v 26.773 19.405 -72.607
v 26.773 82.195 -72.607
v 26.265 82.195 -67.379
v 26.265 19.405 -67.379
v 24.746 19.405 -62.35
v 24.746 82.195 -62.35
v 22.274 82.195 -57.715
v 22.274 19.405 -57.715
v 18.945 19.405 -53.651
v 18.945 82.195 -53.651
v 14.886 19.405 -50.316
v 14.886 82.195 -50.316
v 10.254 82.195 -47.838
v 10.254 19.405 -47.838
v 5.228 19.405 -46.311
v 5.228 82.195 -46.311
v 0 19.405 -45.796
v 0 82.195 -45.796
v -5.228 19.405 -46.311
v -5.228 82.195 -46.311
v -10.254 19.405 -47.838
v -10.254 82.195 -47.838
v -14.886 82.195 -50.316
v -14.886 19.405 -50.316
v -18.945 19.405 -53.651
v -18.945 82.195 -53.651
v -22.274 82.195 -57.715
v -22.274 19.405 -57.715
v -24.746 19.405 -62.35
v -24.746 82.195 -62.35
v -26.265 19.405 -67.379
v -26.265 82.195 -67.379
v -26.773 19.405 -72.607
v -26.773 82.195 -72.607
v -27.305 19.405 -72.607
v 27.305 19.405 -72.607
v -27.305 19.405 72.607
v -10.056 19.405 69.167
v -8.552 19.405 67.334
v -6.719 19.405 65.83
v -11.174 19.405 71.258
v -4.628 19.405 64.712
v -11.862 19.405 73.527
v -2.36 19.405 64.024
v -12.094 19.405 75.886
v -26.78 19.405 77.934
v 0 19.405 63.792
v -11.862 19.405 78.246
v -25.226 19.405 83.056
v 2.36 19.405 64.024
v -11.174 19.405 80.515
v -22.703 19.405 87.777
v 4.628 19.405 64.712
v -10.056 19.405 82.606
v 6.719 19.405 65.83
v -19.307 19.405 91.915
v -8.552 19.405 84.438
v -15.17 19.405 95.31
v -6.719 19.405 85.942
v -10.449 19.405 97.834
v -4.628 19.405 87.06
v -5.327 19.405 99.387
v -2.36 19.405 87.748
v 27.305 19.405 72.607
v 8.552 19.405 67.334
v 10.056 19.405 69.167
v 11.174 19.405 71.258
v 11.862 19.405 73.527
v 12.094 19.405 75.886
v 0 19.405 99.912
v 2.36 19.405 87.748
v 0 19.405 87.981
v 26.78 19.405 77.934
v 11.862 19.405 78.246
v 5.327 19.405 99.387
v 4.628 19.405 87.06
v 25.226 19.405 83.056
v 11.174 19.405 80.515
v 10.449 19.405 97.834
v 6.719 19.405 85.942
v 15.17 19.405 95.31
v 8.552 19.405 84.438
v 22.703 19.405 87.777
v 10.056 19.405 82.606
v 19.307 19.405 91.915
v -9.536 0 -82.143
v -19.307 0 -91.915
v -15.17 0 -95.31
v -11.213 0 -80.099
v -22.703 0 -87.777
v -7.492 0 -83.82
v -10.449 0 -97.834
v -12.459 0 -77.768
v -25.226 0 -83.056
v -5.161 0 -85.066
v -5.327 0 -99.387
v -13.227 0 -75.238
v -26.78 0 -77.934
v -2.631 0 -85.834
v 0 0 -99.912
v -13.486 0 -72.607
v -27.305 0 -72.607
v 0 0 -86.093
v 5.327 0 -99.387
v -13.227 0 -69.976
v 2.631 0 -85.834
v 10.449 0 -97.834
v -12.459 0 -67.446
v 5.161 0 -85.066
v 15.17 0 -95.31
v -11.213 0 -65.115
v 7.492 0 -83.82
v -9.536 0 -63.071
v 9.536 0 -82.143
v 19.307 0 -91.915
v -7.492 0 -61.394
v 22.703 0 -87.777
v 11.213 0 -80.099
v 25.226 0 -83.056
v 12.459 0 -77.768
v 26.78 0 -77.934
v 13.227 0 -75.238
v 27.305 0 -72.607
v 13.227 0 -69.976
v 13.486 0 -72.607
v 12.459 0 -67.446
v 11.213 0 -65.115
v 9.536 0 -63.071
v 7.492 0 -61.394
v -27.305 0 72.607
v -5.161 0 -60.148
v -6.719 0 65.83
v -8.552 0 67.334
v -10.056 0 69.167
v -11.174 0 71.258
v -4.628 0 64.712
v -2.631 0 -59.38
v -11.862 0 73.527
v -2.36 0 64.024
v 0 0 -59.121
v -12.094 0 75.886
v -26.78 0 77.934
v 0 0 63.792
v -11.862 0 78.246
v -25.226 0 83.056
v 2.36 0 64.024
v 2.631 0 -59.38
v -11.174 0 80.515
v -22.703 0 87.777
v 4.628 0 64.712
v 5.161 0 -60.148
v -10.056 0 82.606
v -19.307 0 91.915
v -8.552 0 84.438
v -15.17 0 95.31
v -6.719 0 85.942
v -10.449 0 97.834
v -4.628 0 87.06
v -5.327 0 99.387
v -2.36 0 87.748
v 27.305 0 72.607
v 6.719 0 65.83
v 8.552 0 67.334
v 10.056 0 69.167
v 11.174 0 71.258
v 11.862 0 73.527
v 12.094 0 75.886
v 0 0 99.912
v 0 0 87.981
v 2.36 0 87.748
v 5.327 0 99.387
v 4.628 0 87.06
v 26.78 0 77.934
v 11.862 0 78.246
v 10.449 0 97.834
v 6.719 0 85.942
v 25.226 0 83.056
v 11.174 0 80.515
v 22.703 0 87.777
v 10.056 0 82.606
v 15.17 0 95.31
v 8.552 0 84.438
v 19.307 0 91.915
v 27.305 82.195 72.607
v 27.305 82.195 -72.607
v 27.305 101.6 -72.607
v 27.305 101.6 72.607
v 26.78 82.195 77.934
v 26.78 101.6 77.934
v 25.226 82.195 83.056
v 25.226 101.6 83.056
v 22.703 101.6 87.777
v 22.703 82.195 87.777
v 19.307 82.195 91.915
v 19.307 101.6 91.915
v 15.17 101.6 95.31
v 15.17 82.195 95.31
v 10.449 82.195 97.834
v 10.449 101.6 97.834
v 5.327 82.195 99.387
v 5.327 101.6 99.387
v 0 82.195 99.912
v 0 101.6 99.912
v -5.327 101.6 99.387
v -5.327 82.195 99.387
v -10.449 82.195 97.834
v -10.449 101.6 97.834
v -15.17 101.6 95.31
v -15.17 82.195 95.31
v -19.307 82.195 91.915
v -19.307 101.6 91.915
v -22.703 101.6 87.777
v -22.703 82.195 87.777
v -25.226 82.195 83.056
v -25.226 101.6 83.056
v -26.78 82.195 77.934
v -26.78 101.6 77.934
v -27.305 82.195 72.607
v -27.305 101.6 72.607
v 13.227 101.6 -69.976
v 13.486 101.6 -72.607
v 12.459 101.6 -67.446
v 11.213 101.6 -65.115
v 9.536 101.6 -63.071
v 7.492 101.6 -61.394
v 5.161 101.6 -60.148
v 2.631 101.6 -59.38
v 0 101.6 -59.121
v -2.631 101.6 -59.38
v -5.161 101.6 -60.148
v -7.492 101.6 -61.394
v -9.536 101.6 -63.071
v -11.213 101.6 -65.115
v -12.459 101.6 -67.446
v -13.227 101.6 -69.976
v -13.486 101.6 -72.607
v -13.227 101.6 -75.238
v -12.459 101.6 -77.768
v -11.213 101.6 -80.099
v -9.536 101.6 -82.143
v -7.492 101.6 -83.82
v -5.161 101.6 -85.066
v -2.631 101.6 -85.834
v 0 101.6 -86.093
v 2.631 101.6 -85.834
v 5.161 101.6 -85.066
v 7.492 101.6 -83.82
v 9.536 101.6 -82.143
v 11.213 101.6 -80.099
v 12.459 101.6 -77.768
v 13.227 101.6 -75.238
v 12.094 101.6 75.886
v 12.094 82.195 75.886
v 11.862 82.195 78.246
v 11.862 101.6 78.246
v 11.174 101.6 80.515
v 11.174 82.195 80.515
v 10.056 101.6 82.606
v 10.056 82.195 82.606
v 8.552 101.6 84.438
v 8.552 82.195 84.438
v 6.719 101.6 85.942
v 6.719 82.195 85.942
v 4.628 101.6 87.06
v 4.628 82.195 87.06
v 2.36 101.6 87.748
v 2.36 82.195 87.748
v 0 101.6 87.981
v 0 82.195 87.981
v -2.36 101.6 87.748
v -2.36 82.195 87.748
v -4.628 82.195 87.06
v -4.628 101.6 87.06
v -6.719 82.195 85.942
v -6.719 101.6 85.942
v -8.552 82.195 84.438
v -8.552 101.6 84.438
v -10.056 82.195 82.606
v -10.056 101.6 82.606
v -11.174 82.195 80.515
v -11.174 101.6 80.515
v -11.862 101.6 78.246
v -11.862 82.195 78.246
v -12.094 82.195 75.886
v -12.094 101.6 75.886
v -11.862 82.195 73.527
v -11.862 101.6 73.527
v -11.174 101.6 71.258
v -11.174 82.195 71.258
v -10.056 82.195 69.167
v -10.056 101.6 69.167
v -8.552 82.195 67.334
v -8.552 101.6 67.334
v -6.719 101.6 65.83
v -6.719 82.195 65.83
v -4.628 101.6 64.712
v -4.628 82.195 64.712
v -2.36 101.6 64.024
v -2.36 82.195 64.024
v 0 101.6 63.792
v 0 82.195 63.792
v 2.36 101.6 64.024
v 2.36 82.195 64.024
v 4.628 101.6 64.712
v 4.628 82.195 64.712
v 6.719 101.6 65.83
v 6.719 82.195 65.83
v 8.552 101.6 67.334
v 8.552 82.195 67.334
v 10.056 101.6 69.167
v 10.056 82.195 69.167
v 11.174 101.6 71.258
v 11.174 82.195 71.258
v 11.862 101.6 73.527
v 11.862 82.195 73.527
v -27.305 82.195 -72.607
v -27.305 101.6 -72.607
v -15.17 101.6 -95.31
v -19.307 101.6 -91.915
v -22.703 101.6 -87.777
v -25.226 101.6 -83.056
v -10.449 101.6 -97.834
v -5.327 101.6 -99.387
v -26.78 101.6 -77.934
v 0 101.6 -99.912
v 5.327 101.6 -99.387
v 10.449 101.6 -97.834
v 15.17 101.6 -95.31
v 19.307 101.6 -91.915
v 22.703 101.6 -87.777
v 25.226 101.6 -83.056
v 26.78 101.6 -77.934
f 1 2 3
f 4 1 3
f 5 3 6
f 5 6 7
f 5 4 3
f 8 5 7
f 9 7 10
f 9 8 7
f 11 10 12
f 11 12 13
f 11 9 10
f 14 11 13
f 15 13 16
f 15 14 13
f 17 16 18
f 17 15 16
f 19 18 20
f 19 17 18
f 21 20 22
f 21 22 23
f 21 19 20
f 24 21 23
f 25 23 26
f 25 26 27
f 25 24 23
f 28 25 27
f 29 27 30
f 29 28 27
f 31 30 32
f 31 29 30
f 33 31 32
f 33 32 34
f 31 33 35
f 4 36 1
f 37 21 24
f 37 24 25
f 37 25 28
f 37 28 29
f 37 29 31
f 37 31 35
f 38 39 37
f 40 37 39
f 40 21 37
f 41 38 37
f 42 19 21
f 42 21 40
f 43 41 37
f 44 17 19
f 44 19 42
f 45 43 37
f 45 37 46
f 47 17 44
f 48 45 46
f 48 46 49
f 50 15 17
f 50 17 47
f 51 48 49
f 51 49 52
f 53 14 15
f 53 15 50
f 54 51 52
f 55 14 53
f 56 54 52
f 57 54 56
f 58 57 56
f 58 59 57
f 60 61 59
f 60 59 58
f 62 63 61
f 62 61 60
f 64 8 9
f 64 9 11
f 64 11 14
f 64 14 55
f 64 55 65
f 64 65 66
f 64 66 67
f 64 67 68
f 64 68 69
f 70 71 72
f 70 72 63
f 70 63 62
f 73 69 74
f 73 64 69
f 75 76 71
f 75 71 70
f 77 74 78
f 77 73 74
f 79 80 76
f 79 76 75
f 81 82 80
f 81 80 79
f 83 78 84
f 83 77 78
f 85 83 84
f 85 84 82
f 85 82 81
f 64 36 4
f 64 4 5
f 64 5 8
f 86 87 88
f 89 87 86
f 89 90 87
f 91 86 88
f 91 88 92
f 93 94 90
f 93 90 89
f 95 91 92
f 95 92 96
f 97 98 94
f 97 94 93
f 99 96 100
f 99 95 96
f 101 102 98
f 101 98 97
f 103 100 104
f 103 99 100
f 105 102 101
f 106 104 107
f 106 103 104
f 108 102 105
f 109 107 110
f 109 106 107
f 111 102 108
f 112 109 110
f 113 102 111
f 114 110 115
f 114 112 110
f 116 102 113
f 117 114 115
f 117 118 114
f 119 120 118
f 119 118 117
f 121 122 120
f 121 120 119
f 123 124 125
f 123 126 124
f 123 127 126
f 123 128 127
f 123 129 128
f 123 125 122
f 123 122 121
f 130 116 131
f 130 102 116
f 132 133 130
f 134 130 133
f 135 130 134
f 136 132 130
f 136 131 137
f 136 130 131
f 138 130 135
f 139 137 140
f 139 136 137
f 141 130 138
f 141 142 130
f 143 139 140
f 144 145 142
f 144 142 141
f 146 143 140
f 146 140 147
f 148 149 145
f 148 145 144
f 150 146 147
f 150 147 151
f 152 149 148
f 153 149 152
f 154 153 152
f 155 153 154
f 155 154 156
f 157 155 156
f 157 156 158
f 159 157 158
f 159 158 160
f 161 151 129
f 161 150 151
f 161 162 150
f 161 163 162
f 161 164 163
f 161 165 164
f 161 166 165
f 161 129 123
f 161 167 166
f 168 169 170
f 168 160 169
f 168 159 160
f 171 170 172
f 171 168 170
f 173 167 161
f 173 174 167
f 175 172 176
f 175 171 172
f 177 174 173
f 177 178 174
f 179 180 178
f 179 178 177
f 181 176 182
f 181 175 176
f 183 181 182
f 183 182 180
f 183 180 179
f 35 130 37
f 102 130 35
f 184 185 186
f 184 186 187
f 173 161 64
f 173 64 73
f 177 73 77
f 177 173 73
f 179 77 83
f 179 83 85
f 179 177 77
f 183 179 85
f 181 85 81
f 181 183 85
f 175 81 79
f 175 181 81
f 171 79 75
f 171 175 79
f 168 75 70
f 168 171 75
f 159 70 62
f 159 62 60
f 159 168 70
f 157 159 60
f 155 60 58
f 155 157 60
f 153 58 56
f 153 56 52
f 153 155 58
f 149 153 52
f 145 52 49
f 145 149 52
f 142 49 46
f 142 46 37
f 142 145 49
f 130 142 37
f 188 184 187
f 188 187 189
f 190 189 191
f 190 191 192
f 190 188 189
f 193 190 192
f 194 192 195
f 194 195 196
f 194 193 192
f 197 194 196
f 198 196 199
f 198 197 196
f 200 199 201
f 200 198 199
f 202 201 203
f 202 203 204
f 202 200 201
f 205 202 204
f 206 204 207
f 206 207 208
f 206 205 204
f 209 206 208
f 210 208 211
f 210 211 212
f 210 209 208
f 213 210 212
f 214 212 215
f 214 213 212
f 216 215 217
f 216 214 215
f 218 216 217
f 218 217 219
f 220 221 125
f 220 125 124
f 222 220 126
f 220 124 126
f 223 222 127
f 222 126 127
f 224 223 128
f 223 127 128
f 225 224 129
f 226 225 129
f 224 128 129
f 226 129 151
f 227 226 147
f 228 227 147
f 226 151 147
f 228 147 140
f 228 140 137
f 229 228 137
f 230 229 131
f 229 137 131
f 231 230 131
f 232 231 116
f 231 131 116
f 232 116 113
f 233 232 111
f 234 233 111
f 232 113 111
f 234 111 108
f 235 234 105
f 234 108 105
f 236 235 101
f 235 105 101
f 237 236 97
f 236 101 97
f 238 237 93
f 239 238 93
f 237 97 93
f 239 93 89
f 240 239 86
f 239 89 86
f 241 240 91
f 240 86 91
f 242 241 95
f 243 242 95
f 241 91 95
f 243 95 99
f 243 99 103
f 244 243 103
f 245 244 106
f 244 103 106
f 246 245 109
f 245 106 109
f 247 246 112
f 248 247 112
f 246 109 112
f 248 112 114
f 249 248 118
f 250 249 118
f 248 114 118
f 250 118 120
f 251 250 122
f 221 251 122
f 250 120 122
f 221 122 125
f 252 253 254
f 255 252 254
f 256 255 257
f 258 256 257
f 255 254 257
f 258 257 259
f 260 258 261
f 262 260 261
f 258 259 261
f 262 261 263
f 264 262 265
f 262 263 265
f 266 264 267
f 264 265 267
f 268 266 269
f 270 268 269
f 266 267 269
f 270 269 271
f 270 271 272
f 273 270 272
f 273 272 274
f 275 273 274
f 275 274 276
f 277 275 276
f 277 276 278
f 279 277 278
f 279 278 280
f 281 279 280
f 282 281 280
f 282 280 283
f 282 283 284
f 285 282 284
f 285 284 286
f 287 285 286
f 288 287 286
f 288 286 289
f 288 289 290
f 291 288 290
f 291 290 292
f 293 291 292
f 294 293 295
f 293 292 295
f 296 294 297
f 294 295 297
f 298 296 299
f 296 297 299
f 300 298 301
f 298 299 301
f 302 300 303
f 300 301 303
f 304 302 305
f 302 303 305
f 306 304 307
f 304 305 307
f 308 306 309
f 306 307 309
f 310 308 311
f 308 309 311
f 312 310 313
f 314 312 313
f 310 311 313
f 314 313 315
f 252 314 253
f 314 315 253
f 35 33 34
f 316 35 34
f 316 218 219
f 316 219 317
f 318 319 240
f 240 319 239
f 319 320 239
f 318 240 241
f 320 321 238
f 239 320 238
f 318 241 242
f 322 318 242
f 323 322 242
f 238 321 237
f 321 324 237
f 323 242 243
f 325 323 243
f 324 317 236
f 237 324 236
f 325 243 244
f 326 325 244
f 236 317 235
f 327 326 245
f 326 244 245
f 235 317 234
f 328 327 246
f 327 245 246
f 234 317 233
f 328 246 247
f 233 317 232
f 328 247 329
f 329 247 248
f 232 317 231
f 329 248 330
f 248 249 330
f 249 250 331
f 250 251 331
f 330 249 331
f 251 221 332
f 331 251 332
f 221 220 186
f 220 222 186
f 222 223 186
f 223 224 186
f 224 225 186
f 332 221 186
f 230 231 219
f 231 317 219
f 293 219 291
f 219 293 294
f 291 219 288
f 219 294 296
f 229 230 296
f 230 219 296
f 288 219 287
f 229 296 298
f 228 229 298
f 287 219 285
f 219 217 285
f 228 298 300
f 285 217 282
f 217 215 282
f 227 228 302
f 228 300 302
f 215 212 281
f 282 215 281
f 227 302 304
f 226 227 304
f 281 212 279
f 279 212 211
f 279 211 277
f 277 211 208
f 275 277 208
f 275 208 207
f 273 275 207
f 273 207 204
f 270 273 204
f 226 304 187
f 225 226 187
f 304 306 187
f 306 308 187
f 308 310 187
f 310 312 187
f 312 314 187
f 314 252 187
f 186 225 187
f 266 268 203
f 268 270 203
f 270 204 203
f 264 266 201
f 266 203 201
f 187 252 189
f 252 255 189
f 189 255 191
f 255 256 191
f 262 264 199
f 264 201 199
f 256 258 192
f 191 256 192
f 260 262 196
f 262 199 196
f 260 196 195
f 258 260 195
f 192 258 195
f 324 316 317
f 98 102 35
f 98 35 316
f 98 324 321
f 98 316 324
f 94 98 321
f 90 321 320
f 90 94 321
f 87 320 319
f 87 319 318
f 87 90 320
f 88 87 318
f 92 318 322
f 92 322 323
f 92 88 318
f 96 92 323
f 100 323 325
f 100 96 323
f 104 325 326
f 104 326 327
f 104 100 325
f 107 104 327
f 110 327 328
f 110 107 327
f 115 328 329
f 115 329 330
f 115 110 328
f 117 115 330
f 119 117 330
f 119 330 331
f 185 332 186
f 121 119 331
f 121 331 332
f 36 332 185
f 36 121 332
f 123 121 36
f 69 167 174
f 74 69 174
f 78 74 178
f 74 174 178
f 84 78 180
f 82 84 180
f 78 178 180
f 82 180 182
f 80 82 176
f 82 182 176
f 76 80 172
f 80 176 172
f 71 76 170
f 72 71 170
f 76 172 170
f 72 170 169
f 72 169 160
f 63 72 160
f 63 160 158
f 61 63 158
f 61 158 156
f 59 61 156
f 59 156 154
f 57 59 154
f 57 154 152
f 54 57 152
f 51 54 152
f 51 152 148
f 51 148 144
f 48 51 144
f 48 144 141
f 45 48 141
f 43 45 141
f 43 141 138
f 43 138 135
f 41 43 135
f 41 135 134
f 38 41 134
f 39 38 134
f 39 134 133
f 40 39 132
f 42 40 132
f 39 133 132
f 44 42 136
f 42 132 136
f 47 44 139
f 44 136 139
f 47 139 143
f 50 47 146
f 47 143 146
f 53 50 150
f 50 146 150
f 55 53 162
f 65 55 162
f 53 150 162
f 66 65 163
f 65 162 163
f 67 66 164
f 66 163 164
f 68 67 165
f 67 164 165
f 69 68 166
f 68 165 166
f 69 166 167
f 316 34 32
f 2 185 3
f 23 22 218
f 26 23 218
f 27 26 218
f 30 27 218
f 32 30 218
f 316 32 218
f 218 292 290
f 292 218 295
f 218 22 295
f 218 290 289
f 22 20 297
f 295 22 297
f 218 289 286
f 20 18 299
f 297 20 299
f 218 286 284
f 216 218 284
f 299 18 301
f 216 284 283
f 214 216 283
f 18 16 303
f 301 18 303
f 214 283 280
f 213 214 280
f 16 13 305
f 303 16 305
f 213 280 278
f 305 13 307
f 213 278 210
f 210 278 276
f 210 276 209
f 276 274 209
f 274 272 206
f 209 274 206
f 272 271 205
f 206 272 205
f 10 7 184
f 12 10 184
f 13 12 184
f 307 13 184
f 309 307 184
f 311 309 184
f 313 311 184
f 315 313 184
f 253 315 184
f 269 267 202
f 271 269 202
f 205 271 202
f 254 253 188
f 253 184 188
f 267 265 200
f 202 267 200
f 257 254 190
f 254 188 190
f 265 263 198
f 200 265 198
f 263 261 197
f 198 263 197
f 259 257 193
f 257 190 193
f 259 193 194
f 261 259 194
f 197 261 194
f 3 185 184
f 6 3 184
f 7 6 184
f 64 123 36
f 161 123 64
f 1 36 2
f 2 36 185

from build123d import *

# Parameters (mm, degrees)
F1_DEPTH = 101.6
F2_W     = 62.789462
F2_H     = 290.428608
F3_DEPTH = 76.2
F4_R     = 26.772602
F5_DEPTH = 101.6
F6_R     = 12.094446
F6_R_2   = 13.485849
F7_DEPTH = 101.6


with BuildPart() as f1:
    # F0 (on Front) → F1 (new body)
    with BuildSketch(Plane.XZ):
        with BuildLine():
            Line((27.304832, -72.607152), (27.304832, 72.607152))
            ThreePointArc((27.304832, 72.607152), (0, 99.911984), (-27.304832, 72.607152))
            Line((-27.304832, 72.607152), (-27.304832, -72.607152))
            ThreePointArc((-27.304832, -72.607152), (0, -99.911984), (27.304832, -72.607152))
        make_face()
    extrude(amount=-F1_DEPTH)

    # F2 (on face) → F3 (cut)
    with BuildSketch(Plane.YZ.offset(27.304832)):
        with Locations((50.8, 72.607152)):
            Rectangle(F2_W, F2_H)
    extrude(amount=-F3_DEPTH, mode=Mode.SUBTRACT)

    # F4 (on Front) → F5 (join)
    with BuildSketch(Plane.XZ):
        with Locations((0, -72.568707)):
            Circle(F4_R)
    extrude(amount=-F5_DEPTH)

    # F6 (on face) → F7 (cut)
    with BuildSketch(Plane.XZ):
        with Locations((0, 75.886309)):
            Circle(F6_R)
        with Locations((0, -72.607152)):
            Circle(F6_R_2)
    extrude(amount=-F7_DEPTH, mode=Mode.SUBTRACT)


solid = f1.part
